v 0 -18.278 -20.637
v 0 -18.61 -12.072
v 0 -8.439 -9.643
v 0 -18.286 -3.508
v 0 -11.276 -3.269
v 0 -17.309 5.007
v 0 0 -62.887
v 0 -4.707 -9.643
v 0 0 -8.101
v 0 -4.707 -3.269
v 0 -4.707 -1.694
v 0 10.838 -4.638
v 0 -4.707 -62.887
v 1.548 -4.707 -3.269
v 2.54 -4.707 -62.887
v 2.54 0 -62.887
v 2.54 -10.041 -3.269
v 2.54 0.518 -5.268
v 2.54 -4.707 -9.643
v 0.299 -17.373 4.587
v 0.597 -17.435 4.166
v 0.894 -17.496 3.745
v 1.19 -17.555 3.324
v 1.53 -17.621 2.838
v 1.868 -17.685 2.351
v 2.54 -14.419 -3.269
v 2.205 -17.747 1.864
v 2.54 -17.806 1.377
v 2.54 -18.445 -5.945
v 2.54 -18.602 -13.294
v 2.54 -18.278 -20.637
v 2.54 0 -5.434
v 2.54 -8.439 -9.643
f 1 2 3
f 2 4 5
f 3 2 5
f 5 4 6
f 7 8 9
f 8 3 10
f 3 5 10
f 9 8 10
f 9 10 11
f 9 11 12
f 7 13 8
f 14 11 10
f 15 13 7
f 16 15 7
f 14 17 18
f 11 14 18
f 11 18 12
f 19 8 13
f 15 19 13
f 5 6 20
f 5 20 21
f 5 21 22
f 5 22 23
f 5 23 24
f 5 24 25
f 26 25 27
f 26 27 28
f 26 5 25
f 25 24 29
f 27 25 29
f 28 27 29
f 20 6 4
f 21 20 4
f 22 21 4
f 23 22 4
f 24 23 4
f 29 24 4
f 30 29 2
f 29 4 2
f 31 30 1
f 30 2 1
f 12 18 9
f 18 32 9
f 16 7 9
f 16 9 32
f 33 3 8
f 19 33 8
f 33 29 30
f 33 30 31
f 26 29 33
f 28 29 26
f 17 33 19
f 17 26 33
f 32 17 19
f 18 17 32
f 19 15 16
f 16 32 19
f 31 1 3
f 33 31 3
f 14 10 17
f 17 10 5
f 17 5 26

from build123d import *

# Parameters (mm, degrees)
F1_DEPTH    = 2.54
F2_T4_DEPTH = 40.6971516331
F3_T4_DEPTH = 48.3394519199
F4_T4_DEPTH = 63.1242461628


# Not quite as in the source:
# - a fillet or chamfer that OpenCascade refuses, or shapes differently, is made with other operations: its cross-section is extruded or revolved along the edge and cut away or added


with BuildPart() as f1:
    # F0 (on Right) → F1 (new body)
    with BuildSketch(Plane.YZ):
        Polygon((-0.3011617849, 0), (-4.707176704, 0), (-4.707176704, -3.2687797211), (-4.707176704, -9.6434028819), (-4.707176704, -62.8868843283), (0, -62.8868843283), (0, -10.7670552097), align=None)
        with BuildLine():
            Line((-4.707176704, -9.6434028819), (-4.707176704, -3.2687797211))
            Line((-4.707176704, -3.2687797211), (-8.1328889355, -3.2687797211))
            Line((-8.1328889355, -3.2687797211), (-16.7150776833, 8.5039641708))
            ThreePointArc((-16.7150776833, 8.5039641708), (-18.448774527, -6.0153747507), (-18.2778015733, -20.6368546933))
            Line((-18.2778015733, -20.6368546933), (-8.4392093122, -9.6434028819))
            Line((-8.4392093122, -9.6434028819), (-4.707176704, -9.6434028819))
        make_face()
        Polygon((0, 0), (-0.3011617849, 0), (0, -10.7670552097), (21.1573056877, -4.0066023357), align=None)
    extrude(amount=F1_DEPTH)

    # F2: chamfer of 5.08 on 1 edges, made by hand


with BuildPart() as f2_tool2:
    # F2_s3 → F2_t4 (new body)
    with BuildSketch(Plane(origin=(0, 6.4295894432, -8.8198840726), x_dir=(1, 0, 0), z_dir=(0, -0.5890778812, 0.8080762649))):
        Polygon((-2.54, -8.497560346), (2.54, -13.577560346), (2.54, -8.497560346), align=None)
    extrude(amount=F2_T4_DEPTH)

    split(bisect_by=Plane.XY.offset(-3.2687797211), keep=Keep.TOP)


with BuildPart() as f1_1:
    add(f1.part)

    # F2_t1: cut F2_tool2
    add(f2_tool2.part, mode=Mode.SUBTRACT)

    # F3: chamfer of 5.08 on 1 edges, made by hand


with BuildPart() as f3_tool2:
    # F3_s3 → F3_t4 (new body)
    with BuildSketch(Plane(origin=(0, -15.5659961488, -4.9738461482), x_dir=(1, 0, 0), z_dir=(0, 0.9525532472, 0.3043719948))):
        Polygon((2.54, 5.1761934028), (-2.54, 10.2561934028), (2.54, 10.2561934028), align=None)
    extrude(amount=F3_T4_DEPTH)

    split(bisect_by=Plane.XZ, keep=Keep.BOTTOM)


with BuildPart() as f1_2:
    add(f1_1.part)

    # F3_t1: cut F3_tool2
    add(f3_tool2.part, mode=Mode.SUBTRACT)

    # F4: chamfer of 5.08 on 1 edges, made by hand


with BuildPart() as f4_tool2:
    # F4_s3 → F4_t4 (new body)
    with BuildSketch(Plane(origin=(0, 23.513886354, -4.4528728458), x_dir=(1, 0, 0), z_dir=(0, -0.9825374139, 0.1860651236))):
        Polygon((2.54, -5.08), (-2.54, 0), (2.54, 0), align=None)
    extrude(amount=F4_T4_DEPTH)

    split(bisect_by=Plane(origin=(-5.518780173, -4.4595952689, -3.2509913312), x_dir=(-0.6285178248, 0.7777951812, 0), z_dir=(0.7071067812, 0.5713962066, 0.4165409645)), keep=Keep.TOP)


with BuildPart() as f1_3:
    add(f1_2.part)

    # F4_t1: cut F4_tool2
    add(f4_tool2.part, mode=Mode.SUBTRACT)


solid = f1_3.part
